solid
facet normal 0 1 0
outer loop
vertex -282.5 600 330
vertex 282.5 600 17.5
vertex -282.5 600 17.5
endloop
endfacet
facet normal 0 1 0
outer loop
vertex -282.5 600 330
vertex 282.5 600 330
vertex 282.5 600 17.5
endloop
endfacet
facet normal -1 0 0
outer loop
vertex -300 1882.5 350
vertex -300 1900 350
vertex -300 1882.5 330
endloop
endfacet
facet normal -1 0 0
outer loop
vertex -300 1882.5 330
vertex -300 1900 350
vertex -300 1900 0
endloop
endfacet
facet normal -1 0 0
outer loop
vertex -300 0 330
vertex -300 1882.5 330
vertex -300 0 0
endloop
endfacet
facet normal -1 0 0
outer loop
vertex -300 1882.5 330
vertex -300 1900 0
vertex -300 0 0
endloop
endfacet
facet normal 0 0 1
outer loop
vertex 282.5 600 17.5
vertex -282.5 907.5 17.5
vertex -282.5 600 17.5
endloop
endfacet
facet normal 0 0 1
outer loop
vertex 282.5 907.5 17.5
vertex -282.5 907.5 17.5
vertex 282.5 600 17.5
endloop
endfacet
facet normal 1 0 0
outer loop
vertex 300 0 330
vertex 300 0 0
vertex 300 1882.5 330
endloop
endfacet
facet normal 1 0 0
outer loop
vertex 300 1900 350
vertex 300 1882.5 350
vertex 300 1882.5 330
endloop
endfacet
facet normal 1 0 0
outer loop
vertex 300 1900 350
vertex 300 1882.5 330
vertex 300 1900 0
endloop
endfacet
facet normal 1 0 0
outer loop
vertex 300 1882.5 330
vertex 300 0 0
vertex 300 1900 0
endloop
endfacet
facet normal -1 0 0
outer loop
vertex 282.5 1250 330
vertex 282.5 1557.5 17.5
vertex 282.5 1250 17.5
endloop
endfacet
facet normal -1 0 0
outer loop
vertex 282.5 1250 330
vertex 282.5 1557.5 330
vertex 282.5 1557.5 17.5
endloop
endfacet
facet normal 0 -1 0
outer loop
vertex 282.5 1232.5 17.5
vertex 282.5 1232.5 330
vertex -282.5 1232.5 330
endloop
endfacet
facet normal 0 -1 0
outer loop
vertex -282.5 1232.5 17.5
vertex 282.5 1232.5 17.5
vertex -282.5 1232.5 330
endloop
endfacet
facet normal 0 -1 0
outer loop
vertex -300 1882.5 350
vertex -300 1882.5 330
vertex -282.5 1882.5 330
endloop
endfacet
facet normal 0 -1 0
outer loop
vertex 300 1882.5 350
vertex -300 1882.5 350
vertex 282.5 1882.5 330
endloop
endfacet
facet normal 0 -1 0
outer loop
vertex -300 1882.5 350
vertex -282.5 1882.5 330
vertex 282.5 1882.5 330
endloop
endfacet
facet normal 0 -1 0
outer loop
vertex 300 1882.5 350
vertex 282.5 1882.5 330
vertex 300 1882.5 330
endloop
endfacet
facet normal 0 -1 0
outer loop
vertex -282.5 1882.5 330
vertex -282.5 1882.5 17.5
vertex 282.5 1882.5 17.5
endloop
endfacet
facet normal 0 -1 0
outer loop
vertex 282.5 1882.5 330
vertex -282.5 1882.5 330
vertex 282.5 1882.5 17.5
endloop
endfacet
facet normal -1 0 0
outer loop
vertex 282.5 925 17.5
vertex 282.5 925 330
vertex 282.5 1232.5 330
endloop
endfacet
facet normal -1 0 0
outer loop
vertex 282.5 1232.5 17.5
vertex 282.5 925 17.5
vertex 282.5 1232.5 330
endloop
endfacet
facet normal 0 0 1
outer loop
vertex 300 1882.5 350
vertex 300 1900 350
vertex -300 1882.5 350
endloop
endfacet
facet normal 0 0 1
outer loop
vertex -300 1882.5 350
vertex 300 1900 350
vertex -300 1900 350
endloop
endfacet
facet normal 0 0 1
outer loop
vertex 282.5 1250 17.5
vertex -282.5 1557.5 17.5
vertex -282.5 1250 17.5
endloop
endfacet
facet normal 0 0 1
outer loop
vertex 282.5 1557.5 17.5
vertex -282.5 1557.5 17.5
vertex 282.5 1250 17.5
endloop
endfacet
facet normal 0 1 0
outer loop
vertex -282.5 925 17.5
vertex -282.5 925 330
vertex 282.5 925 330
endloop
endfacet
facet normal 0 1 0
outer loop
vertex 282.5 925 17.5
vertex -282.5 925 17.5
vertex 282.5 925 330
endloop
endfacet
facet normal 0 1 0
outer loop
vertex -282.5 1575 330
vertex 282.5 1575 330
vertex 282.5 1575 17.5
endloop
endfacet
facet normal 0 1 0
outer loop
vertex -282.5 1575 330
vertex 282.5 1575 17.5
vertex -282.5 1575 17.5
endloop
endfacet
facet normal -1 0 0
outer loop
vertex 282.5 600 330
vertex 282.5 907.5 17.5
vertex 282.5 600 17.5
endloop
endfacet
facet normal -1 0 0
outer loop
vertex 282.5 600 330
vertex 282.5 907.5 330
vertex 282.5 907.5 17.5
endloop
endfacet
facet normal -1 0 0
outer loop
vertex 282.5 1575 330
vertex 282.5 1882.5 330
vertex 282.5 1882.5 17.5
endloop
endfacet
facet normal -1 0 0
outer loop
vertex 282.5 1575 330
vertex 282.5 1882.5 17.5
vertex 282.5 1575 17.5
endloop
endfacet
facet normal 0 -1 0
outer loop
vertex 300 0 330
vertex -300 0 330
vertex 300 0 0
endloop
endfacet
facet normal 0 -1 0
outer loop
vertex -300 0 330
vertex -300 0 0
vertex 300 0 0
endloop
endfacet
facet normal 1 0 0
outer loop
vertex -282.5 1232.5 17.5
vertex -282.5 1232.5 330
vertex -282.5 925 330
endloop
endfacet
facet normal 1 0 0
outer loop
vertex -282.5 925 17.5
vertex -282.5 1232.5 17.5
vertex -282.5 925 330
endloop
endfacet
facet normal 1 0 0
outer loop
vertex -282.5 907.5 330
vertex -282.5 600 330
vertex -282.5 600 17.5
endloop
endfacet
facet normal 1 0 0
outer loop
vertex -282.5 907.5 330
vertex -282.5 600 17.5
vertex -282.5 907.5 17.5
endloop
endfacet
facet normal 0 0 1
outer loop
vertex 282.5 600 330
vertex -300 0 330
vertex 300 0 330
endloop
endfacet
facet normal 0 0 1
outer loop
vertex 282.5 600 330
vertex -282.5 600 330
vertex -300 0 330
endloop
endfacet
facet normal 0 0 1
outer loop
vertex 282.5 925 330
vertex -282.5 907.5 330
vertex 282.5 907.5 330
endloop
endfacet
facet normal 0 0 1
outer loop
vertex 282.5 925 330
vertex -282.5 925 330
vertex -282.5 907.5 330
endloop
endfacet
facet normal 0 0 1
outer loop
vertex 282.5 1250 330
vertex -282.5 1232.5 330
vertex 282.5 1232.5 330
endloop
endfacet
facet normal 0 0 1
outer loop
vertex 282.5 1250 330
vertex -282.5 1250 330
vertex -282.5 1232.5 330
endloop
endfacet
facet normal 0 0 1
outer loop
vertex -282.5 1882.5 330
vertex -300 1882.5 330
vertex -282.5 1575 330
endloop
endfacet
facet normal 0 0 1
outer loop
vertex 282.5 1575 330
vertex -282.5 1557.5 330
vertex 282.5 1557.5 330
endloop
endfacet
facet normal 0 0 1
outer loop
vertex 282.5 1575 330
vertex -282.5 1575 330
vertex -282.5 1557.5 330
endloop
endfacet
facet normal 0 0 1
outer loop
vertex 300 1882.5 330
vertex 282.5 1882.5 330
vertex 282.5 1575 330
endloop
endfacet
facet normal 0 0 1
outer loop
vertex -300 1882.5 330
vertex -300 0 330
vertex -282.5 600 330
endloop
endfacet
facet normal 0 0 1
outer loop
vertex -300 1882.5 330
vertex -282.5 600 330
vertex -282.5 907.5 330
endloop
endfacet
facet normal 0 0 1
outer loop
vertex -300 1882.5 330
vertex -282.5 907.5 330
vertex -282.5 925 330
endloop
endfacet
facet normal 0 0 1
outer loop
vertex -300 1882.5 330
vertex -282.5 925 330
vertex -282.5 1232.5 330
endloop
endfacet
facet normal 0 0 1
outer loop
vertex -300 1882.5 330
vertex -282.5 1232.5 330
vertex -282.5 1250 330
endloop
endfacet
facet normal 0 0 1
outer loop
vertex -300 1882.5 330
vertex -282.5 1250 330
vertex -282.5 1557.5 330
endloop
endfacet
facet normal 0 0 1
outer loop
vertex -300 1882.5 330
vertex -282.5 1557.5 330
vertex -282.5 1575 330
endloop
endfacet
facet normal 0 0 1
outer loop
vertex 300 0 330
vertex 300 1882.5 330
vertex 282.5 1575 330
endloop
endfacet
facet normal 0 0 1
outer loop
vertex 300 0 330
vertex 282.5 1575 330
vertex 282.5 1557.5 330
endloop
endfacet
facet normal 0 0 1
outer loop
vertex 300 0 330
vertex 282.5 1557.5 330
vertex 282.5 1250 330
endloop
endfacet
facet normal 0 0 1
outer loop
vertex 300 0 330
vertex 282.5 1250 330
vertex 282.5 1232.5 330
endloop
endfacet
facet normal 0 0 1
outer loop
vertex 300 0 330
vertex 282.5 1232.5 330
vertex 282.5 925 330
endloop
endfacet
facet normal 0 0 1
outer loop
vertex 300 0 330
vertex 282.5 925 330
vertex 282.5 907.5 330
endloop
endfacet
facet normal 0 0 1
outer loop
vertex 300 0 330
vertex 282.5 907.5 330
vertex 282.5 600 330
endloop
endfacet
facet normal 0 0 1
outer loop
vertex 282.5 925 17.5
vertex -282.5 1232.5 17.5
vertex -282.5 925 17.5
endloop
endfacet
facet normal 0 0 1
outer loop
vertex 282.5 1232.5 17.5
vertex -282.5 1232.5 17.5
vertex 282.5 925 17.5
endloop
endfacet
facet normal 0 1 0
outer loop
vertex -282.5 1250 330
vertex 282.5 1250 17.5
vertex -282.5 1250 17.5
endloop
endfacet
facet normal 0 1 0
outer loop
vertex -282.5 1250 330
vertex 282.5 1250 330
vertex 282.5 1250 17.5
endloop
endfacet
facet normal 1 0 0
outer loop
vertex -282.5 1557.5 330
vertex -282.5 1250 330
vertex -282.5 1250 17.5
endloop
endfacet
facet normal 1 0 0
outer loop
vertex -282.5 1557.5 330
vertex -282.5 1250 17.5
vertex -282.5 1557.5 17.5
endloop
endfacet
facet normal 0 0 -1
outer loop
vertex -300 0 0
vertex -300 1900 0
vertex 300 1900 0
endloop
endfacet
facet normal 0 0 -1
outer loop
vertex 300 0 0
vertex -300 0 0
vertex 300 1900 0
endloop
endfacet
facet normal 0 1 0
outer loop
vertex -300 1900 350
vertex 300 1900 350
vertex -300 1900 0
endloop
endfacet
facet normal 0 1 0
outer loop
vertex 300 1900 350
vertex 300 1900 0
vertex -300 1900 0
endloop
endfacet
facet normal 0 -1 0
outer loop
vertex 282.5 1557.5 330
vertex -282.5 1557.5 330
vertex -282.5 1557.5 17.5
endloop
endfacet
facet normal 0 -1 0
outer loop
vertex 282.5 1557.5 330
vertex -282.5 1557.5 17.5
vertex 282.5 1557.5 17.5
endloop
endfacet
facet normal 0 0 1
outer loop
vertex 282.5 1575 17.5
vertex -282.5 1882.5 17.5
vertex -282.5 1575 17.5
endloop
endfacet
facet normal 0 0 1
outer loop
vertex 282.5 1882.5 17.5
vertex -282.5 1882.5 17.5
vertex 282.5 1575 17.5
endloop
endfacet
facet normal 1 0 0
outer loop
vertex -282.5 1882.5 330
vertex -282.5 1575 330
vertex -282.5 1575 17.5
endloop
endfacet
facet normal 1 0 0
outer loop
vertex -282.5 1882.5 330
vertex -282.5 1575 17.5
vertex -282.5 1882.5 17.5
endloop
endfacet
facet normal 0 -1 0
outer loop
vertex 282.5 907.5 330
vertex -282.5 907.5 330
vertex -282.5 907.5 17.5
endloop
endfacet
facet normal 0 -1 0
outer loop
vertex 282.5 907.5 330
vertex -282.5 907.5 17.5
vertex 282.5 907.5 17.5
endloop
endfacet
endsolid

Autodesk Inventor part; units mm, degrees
ref_plane "YZ Plane" through (0, 0, 0) normal (1, 0, 0) x (0, 1, 0)
ref_plane "XZ Plane" through (0, 0, 0) normal (0, 1, 0) x (-1, 0, 0)
ref_plane "XY Plane" through (0, 0, 0) normal (0, 0, 1) x (1, 0, 0)
sketch "Sketch1" plane through (0, 0, 0) normal (0, 0, 1) x (1, 0, 0)
  line L0 (-300, 0) -> (300, 0)
  line L1 (300, 0) -> (300, 1900)
  line L2 (300, 1900) -> (-300, 1900)
  line L3 (-300, 1900) -> (-300, 0)
  point P0 (0, 0)
  point P1 (0, 0)
  dimension "d0" = 600
  dimension "d1" = 1900
extrude "Extrusion1" add sketch "Sketch1" along normal blind 330
sketch "Sketch2" plane through (-300, 1900, 0) normal (0, 1, 0) x (1, 0, 0)
  line L0 (600, 0) -> (0, 0) construction
  line L1 (0, 0) -> (0, -330) construction
  line L2 (600, -330) -> (0, -330) construction
  line L3 (600, 0) -> (600, -330) construction
  line L4 (0, 0) -> (600, 0)
  line L5 (600, 0) -> (600, -350)
  line L6 (600, -350) -> (0, -350)
  line L7 (0, -350) -> (0, 0)
  point P0 (300, 0)
  dimension "d4" = 350
extrude "Extrusion2" add sketch "Sketch2" against normal blind 17.5
sketch "Sketch3" plane through (0, 0, 330) normal (0, 0, 1) x (1, 0, 0)
  line L0 (300, 1882.5) -> (-300, 1882.5) projected
  line L1 (-282.5, 1882.5) -> (282.5, 1882.5)
  line L2 (282.5, 1882.5) -> (282.5, 1575)
  line L3 (282.5, 1575) -> (-282.5, 1575)
  line L4 (-282.5, 1575) -> (-282.5, 1882.5)
  line L5 (-282.5, 1557.5) -> (282.5, 1557.5)
  line L6 (282.5, 1557.5) -> (282.5, 1250)
  line L7 (282.5, 1250) -> (-282.5, 1250)
  line L8 (-282.5, 1250) -> (-282.5, 1557.5)
  line L9 (282.5, 1232.5) -> (-282.5, 1232.5)
  line L10 (-282.5, 1232.5) -> (-282.5, 925)
  line L11 (-282.5, 925) -> (282.5, 925)
  line L12 (282.5, 925) -> (282.5, 1232.5)
  line L13 (-282.5, 907.5) -> (282.5, 907.5)
  line L14 (282.5, 907.5) -> (282.5, 600)
  line L15 (282.5, 600) -> (-282.5, 600)
  line L16 (-282.5, 600) -> (-282.5, 907.5)
  line L17 (-300, 0) -> (300, 0) projected
  line L18 (-282.5, 1575) -> (-282.5, 1557.5) construction
  line L19 (-282.5, 1250) -> (-282.5, 1232.5) construction
  line L20 (-282.5, 925) -> (-282.5, 907.5) construction
  point P0 (0, 0)
  point P1 (0, 600)
  point P2 (0, 0)
  dimension "d7" = 600
  dimension "d8" = 17.5
  dimension "d9" = 565
extrude "Extrusion3" cut sketch "Sketch3" against normal blind 312.5
properties part number "Libreria"
